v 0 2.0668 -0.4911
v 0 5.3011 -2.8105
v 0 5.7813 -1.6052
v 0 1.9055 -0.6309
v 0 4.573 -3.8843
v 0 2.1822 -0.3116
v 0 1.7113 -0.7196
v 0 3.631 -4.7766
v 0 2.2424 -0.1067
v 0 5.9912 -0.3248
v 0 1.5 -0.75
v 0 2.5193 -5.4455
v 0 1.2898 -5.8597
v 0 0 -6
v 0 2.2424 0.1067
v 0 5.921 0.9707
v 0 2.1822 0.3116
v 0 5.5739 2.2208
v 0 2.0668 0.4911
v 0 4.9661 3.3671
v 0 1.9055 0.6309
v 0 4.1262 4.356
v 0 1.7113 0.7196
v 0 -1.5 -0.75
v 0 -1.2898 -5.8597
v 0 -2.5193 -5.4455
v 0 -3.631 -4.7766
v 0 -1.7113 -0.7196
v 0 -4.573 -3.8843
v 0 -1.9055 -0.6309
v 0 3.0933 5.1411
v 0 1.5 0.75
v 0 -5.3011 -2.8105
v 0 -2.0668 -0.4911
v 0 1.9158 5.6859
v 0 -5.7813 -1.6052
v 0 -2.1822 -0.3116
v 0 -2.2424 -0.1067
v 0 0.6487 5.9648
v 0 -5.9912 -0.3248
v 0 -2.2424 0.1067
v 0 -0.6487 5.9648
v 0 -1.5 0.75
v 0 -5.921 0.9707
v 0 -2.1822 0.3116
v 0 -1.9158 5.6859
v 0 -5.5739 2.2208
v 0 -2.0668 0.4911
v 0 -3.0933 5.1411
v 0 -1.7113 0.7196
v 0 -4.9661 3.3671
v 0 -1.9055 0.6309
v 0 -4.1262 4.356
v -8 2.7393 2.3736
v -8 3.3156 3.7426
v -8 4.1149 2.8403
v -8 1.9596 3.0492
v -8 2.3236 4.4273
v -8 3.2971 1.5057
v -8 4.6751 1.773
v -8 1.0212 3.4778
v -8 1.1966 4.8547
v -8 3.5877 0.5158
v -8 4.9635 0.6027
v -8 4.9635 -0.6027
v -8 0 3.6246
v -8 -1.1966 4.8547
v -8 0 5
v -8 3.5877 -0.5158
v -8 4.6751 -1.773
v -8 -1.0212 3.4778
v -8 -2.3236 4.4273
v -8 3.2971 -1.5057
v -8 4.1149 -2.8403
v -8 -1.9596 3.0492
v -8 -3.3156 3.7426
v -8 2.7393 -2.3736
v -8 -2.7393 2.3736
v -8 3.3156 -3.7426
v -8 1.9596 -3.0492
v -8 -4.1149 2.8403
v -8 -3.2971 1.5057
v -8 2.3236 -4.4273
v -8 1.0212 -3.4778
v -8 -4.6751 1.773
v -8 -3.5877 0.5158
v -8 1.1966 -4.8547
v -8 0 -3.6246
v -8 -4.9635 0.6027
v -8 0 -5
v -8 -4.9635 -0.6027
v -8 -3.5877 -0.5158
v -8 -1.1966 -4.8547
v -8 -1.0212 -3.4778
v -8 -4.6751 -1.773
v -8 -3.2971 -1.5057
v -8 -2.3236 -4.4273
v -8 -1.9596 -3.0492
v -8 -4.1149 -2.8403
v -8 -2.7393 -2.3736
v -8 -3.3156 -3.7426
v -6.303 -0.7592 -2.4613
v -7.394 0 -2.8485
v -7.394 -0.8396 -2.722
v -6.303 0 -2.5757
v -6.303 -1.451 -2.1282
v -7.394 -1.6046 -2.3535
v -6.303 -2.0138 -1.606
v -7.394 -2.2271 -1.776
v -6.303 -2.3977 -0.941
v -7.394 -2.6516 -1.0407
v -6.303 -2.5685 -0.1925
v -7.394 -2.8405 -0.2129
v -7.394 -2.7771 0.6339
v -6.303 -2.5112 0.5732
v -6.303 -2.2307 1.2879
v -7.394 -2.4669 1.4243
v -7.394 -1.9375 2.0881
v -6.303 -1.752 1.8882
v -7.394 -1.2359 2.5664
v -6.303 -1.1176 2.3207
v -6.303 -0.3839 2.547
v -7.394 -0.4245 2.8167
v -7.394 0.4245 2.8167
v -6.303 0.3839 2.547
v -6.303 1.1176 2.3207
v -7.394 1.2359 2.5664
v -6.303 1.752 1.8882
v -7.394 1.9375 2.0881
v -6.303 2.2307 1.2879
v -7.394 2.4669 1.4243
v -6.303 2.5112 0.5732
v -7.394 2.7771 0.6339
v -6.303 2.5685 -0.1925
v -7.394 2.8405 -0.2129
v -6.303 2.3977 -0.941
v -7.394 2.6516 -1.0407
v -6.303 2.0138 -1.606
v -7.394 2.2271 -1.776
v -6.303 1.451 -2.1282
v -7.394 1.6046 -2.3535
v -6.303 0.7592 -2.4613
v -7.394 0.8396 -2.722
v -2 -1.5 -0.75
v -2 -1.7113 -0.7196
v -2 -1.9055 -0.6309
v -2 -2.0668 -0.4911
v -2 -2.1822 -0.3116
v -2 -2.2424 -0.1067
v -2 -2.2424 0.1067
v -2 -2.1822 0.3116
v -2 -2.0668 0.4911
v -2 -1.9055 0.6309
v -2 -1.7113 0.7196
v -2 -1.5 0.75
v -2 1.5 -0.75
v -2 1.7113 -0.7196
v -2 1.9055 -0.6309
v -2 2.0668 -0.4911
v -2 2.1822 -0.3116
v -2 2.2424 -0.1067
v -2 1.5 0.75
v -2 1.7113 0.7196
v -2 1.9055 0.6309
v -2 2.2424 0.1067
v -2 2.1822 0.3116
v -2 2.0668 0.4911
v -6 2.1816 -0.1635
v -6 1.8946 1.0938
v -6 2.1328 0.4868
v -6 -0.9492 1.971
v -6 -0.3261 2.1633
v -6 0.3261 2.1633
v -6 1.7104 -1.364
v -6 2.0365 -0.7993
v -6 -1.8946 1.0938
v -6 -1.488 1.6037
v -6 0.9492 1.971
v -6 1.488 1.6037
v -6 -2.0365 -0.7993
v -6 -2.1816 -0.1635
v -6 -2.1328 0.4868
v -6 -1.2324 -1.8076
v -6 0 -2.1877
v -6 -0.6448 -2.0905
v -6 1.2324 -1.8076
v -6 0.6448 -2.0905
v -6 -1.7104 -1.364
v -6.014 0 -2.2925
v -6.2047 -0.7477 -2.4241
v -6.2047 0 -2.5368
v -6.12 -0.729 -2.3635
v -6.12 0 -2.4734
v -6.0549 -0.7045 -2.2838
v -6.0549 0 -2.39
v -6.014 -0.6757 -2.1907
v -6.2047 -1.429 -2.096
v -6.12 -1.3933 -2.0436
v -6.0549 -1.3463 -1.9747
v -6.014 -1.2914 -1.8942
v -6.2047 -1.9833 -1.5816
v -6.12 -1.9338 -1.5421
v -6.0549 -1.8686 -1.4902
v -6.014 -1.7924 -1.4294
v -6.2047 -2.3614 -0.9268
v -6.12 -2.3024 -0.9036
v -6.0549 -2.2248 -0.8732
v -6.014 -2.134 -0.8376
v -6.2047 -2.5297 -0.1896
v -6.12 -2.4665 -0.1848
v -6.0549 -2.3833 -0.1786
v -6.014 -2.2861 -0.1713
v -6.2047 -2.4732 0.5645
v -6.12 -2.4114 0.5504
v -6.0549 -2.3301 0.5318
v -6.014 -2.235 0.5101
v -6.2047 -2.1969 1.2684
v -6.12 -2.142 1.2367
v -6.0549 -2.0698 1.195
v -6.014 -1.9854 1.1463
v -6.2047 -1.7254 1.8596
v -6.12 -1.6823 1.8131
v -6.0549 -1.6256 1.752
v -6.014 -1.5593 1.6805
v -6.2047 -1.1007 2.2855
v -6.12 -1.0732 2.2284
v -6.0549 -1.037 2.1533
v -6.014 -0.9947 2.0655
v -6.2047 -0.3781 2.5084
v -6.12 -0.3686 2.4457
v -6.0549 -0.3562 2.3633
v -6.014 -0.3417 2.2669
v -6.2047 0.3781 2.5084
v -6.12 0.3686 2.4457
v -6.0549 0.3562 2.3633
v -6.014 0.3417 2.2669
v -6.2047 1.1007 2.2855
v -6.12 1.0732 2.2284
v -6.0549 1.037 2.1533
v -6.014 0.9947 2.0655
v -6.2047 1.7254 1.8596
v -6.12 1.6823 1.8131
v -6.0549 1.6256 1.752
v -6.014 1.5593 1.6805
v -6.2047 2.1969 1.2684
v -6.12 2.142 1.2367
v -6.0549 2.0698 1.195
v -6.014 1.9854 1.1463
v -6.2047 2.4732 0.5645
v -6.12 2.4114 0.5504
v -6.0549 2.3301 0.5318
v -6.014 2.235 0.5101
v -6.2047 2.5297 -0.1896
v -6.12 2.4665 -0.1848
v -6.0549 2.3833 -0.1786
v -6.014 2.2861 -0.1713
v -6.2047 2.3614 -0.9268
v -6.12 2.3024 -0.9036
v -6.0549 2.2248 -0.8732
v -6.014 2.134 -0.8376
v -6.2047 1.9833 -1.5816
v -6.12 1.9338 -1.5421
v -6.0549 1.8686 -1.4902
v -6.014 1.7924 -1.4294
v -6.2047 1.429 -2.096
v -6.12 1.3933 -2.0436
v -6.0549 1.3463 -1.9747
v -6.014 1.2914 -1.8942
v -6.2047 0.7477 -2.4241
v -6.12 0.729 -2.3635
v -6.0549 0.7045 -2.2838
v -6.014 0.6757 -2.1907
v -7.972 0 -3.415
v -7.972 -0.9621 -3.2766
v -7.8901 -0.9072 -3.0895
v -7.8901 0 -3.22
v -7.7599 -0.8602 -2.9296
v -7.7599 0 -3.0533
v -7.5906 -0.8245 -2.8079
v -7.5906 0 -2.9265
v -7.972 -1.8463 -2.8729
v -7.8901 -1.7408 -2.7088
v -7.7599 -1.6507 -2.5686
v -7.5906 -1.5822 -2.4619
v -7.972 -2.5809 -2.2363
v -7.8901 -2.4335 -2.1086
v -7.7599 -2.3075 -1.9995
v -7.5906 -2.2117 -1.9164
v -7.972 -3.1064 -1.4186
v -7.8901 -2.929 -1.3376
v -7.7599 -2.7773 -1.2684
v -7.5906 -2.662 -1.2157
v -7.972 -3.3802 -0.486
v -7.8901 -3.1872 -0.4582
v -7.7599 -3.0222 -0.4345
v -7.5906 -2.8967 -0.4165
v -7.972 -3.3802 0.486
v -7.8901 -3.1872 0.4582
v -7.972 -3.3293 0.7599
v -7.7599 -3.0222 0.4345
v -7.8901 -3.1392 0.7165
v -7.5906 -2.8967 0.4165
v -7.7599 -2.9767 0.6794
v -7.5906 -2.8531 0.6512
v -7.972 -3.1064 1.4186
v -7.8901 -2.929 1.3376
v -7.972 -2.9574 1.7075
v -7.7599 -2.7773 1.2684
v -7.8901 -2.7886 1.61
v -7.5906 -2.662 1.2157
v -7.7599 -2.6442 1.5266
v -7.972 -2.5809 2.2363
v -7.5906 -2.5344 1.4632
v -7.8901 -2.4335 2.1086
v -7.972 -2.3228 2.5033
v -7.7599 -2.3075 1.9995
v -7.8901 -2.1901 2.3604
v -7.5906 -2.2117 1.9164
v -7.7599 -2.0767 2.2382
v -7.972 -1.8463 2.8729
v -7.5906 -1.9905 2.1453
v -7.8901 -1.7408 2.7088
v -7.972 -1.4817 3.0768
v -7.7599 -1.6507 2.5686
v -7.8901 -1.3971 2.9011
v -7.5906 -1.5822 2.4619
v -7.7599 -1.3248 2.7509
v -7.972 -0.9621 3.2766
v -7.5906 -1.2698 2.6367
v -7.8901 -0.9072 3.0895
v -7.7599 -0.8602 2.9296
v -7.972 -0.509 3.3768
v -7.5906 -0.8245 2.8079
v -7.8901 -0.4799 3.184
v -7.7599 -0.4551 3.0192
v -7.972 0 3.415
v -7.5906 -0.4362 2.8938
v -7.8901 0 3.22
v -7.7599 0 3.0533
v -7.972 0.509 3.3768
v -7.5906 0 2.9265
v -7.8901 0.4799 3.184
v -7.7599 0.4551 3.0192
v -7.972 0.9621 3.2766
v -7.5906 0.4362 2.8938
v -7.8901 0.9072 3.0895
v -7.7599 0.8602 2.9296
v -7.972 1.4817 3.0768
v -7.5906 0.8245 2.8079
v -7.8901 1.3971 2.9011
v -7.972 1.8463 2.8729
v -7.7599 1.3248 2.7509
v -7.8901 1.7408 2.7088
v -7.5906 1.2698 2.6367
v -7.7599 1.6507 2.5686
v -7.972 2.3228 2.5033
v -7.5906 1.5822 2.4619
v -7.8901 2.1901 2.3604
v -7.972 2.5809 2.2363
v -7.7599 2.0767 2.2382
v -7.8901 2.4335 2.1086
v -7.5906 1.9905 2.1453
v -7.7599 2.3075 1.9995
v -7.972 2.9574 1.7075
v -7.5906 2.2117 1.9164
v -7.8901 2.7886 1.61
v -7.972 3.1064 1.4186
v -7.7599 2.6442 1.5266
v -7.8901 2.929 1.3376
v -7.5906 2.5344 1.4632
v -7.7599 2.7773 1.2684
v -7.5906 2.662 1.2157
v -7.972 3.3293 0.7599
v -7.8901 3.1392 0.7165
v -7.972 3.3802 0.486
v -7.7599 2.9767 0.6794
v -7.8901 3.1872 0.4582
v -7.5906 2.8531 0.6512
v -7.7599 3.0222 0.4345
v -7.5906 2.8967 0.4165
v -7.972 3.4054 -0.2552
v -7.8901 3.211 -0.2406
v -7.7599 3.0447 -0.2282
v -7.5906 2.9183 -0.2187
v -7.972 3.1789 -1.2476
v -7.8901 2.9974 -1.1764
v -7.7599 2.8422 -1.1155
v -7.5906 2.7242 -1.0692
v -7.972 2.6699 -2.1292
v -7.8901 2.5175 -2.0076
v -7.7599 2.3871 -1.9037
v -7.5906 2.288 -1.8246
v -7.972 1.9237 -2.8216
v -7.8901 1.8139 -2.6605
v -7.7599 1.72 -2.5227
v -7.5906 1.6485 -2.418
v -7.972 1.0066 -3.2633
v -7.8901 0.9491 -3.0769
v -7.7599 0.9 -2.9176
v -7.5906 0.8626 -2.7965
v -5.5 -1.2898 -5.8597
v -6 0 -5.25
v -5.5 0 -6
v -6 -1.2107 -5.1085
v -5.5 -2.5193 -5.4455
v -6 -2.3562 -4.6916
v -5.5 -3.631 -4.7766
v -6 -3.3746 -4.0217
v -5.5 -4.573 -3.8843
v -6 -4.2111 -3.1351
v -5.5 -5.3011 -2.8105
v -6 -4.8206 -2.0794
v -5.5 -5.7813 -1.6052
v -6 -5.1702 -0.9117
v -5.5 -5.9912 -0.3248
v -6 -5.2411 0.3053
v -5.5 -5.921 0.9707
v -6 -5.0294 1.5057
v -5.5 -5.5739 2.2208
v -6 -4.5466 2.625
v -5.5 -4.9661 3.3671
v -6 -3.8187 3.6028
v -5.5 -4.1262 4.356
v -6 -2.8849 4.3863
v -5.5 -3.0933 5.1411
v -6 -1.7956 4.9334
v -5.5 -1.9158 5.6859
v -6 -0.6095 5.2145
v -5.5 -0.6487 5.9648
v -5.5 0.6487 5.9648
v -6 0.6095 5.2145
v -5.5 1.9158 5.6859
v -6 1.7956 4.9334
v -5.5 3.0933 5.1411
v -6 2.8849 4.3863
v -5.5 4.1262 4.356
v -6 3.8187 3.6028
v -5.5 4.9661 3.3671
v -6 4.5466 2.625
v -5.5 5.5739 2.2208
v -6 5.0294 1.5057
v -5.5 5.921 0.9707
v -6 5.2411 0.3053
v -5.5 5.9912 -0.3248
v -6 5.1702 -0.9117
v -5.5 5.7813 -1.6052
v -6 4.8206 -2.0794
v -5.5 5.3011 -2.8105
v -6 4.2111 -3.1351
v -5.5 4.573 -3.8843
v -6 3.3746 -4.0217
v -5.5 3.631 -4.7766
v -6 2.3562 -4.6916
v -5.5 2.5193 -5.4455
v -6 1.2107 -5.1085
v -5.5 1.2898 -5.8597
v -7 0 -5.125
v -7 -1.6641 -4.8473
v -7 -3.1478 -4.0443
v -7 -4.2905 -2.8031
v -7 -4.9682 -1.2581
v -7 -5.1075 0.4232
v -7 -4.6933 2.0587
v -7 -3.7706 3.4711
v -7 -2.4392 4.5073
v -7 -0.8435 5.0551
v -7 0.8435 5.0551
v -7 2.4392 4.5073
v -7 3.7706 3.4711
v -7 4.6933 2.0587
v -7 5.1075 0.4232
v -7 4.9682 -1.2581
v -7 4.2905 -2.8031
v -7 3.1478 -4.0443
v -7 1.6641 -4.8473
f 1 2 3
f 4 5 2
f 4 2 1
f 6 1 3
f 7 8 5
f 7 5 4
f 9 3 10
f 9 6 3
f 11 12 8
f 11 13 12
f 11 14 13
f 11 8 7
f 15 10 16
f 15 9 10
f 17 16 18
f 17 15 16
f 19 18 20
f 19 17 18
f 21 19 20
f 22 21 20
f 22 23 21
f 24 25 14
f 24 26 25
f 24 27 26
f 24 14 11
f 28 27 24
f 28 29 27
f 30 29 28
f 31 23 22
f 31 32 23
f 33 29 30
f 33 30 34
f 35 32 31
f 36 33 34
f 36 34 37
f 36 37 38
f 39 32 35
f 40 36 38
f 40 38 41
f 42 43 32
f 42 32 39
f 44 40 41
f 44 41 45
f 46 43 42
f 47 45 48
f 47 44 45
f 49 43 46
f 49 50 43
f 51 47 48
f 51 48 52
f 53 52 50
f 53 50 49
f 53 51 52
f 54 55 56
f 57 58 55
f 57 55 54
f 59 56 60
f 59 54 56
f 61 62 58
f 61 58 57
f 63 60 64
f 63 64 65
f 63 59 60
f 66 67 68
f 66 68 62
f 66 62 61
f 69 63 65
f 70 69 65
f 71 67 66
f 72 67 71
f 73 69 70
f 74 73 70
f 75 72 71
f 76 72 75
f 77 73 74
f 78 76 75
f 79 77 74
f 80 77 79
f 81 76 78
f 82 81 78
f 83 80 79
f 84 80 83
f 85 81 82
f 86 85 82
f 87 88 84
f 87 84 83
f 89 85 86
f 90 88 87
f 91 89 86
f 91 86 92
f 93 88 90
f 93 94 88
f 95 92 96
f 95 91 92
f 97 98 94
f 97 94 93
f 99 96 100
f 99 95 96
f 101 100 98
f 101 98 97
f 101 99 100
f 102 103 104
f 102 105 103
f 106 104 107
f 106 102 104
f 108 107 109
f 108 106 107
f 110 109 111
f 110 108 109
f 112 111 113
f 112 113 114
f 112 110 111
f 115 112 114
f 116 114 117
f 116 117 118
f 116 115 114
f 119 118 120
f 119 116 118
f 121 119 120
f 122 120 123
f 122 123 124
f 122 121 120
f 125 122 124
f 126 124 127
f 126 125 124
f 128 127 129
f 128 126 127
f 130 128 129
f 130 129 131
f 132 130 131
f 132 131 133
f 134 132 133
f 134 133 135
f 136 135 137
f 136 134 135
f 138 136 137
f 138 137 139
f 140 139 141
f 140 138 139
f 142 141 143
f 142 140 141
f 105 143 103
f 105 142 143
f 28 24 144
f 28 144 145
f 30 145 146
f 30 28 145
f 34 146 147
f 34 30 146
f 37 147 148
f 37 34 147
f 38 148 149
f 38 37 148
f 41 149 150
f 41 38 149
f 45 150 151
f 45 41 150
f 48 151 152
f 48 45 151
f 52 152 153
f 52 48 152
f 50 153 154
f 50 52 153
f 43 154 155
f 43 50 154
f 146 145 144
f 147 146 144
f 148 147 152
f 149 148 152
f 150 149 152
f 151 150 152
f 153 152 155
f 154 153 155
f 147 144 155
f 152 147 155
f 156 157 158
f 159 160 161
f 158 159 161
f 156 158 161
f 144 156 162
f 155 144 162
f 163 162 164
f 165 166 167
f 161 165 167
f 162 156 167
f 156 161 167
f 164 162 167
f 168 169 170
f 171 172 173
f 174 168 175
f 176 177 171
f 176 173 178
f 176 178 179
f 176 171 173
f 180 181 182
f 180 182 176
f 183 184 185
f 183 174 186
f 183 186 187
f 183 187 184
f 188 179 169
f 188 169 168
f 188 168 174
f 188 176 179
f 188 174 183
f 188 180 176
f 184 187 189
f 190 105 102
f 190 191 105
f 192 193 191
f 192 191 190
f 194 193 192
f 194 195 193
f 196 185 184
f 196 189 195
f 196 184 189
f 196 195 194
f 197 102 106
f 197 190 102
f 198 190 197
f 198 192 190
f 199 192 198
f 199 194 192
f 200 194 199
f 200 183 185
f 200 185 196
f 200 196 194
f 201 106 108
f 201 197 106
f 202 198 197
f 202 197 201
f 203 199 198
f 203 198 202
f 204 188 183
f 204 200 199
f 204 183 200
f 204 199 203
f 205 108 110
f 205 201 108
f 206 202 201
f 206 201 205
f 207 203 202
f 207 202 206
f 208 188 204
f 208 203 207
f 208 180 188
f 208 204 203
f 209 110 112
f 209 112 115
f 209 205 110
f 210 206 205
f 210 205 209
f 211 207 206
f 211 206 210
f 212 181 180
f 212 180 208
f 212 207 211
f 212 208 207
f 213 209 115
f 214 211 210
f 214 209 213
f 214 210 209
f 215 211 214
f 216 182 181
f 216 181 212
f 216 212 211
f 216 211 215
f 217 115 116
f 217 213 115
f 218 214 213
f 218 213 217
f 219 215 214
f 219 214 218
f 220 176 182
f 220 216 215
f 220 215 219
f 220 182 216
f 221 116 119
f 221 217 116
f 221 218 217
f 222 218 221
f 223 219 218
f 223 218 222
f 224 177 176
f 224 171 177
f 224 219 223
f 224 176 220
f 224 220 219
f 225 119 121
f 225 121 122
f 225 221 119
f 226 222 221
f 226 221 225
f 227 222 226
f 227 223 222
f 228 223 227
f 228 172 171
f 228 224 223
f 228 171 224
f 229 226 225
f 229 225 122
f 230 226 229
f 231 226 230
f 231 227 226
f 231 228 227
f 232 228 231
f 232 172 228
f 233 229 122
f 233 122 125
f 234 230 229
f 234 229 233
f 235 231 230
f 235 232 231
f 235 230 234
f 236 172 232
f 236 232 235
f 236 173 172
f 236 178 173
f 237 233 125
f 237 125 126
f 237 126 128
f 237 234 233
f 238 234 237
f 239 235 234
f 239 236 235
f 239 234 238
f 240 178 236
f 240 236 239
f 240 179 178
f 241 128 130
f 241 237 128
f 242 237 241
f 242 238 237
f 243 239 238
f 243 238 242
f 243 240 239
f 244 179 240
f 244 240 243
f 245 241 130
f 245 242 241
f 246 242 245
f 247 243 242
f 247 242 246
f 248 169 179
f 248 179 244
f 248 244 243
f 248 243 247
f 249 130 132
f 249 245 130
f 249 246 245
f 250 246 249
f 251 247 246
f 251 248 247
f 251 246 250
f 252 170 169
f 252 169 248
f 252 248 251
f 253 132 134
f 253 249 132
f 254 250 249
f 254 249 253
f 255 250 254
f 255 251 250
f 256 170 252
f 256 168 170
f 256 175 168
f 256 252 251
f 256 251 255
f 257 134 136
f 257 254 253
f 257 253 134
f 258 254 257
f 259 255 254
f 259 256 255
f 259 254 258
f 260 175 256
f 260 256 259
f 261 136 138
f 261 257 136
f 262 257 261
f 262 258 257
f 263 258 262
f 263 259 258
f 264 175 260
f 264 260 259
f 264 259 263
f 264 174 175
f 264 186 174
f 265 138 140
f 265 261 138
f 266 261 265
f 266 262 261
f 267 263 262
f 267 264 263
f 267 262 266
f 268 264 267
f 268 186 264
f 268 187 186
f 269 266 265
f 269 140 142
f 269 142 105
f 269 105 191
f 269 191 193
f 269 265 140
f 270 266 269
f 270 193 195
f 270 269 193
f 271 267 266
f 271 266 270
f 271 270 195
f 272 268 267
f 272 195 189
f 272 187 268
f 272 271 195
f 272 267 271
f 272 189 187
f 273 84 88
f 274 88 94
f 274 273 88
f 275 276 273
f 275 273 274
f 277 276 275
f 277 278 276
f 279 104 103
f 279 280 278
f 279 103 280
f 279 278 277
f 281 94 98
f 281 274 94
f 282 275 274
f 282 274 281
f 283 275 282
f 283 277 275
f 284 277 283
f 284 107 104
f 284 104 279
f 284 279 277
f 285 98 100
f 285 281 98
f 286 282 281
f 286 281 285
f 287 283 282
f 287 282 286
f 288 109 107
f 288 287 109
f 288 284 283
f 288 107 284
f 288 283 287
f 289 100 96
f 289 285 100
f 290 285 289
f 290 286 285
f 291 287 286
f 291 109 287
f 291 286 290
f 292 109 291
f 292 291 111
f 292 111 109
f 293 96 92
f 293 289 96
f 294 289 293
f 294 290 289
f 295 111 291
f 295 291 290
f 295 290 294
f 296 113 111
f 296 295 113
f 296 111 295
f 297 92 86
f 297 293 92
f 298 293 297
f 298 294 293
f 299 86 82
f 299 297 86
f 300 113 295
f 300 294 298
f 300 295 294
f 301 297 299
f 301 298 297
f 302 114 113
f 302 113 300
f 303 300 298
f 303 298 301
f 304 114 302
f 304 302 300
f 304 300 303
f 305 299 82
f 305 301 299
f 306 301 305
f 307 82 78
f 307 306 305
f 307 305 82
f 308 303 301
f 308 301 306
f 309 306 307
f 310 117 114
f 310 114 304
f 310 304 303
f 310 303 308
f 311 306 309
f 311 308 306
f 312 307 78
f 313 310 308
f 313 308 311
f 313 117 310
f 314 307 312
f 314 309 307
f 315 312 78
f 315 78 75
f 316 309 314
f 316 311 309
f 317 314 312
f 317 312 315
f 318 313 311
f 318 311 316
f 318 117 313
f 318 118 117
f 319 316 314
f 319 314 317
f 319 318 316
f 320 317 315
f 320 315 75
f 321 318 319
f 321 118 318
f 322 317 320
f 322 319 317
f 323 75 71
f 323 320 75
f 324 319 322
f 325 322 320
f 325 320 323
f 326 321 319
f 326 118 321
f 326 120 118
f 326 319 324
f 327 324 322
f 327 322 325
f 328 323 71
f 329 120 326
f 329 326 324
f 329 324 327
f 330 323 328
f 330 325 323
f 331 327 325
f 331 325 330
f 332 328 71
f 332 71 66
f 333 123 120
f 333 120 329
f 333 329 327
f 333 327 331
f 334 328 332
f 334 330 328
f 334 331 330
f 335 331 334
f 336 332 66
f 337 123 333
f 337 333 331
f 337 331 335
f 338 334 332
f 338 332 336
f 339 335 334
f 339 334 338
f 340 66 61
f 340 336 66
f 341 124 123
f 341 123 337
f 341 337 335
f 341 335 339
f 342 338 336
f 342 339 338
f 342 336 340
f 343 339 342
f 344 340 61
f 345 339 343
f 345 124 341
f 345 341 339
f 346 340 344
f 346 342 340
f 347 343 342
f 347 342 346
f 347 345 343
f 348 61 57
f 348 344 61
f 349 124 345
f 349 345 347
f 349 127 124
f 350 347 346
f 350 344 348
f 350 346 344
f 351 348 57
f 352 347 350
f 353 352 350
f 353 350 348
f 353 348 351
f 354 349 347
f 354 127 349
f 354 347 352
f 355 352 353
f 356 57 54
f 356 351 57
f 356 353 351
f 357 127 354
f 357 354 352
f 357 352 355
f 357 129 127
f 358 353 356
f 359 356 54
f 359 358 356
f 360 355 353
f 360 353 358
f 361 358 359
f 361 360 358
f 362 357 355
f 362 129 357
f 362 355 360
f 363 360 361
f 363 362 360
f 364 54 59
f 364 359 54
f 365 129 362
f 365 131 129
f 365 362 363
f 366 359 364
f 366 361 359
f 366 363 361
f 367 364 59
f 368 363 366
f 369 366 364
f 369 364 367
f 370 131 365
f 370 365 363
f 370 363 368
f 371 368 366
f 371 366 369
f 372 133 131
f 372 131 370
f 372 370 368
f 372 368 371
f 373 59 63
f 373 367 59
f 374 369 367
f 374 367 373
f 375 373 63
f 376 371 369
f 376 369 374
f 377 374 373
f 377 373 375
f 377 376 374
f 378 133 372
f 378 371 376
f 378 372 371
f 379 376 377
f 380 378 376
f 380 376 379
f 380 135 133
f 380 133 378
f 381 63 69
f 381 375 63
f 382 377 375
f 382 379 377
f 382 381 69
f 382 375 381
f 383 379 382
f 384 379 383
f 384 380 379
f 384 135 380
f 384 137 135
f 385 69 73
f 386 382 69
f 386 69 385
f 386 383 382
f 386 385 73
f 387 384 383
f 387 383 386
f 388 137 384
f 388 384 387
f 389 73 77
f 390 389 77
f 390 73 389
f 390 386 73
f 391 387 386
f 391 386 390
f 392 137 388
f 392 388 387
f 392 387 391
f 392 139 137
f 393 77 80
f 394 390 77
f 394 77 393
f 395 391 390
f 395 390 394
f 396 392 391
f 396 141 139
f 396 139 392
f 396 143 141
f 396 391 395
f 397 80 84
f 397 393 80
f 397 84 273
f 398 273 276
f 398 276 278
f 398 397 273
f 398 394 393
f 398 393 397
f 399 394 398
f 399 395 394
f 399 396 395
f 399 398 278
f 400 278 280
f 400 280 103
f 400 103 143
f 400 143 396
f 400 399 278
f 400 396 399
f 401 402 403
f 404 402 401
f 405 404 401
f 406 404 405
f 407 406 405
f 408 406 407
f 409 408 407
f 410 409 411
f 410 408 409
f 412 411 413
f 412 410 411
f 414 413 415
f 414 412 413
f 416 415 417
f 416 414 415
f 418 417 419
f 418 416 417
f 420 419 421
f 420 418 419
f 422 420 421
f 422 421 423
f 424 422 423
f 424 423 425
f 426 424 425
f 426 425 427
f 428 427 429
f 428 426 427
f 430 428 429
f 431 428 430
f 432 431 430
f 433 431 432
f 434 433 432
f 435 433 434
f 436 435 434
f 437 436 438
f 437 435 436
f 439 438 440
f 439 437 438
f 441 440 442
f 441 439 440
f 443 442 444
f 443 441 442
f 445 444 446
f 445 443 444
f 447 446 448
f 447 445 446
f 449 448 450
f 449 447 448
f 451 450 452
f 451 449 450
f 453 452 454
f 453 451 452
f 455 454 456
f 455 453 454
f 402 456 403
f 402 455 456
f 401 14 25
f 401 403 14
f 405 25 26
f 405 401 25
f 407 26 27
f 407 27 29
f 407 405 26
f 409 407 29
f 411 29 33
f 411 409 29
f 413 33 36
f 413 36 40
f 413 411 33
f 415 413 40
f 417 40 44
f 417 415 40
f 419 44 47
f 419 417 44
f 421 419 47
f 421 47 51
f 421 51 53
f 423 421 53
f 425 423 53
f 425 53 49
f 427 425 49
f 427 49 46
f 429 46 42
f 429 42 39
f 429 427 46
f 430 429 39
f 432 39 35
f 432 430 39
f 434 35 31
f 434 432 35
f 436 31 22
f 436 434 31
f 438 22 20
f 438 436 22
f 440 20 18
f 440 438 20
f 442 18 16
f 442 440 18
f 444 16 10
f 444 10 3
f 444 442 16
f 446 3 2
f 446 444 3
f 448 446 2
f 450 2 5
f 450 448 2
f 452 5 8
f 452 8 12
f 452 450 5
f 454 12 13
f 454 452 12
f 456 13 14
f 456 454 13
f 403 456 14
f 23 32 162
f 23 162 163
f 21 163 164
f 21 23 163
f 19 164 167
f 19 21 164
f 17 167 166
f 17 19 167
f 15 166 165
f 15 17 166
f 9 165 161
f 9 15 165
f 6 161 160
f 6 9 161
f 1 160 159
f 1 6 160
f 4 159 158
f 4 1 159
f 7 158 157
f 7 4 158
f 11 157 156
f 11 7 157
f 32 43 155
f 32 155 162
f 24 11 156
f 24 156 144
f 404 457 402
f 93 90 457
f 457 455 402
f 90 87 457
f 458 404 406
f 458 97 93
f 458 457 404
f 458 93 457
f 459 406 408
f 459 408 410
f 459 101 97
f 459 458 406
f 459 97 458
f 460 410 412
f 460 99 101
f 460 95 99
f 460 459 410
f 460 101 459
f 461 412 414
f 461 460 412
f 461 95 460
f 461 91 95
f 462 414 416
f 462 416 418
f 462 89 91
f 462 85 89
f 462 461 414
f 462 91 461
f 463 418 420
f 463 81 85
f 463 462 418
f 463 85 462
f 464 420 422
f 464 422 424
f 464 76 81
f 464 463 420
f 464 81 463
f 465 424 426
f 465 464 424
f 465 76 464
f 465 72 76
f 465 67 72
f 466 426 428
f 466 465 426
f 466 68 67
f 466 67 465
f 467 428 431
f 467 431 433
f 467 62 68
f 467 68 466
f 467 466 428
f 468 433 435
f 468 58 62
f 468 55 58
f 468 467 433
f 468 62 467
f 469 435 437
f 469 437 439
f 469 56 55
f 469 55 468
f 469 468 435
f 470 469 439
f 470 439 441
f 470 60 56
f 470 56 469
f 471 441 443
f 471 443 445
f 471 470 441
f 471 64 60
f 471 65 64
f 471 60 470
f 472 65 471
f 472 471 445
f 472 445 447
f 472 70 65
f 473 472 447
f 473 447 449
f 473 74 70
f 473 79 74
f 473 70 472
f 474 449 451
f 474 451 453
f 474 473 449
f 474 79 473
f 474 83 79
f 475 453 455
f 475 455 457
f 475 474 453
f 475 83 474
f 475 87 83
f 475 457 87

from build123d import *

# Parameters (mm, degrees)
ENL_V_MAT_EXTRU_1_DEPTH = 2


with BuildPart() as part:
    # Esquisse1 → Révolution1 (revolve)
    with BuildSketch(Plane.XY):
        with BuildLine():
            Line((0, 0), (0, 6))
            Line((0, 6), (-5.5, 6))
            Line((-5.5, 6), (-6, 5.25))
            Line((-6, 5.25), (-8, 5))
            Line((-8, 5), (-8, 3.624621125))
            ThreePointArc((-8, 3.624621125), (-7.83056435, 3.132291358), (-7.3940285, 2.848507125))
            Line((-7.3940285, 2.848507125), (-6.30298575, 2.575746437))
            ThreePointArc((-6.30298575, 2.575746437), (-6.084717825, 2.433854321), (-6, 2.187689437))
            Line((-6, 2.187689437), (-6, 0))
            Line((-6, 0), (0, 0))
        make_face()
    revolve(axis=Axis((3.088773822, 0, 0), (-1, 0, 0)))

    # Esquisse2 → Enlèv. mat.-Extru.1 (cut)
    with BuildSketch(Plane(origin=(0, 0, 0), x_dir=(0, 0, -1), z_dir=(1, 0, 0))):
        with BuildLine():
            Line((-0.75, -1.5), (-0.75, 1.5))
            ThreePointArc((-0.75, 1.5), (0, 2.25), (0.75, 1.5))
            Line((0.75, 1.5), (0.75, -1.5))
            ThreePointArc((0.75, -1.5), (0, -2.25), (-0.75, -1.5))
        make_face()
    extrude(amount=-ENL_V_MAT_EXTRU_1_DEPTH, mode=Mode.SUBTRACT)


solid = part.part
